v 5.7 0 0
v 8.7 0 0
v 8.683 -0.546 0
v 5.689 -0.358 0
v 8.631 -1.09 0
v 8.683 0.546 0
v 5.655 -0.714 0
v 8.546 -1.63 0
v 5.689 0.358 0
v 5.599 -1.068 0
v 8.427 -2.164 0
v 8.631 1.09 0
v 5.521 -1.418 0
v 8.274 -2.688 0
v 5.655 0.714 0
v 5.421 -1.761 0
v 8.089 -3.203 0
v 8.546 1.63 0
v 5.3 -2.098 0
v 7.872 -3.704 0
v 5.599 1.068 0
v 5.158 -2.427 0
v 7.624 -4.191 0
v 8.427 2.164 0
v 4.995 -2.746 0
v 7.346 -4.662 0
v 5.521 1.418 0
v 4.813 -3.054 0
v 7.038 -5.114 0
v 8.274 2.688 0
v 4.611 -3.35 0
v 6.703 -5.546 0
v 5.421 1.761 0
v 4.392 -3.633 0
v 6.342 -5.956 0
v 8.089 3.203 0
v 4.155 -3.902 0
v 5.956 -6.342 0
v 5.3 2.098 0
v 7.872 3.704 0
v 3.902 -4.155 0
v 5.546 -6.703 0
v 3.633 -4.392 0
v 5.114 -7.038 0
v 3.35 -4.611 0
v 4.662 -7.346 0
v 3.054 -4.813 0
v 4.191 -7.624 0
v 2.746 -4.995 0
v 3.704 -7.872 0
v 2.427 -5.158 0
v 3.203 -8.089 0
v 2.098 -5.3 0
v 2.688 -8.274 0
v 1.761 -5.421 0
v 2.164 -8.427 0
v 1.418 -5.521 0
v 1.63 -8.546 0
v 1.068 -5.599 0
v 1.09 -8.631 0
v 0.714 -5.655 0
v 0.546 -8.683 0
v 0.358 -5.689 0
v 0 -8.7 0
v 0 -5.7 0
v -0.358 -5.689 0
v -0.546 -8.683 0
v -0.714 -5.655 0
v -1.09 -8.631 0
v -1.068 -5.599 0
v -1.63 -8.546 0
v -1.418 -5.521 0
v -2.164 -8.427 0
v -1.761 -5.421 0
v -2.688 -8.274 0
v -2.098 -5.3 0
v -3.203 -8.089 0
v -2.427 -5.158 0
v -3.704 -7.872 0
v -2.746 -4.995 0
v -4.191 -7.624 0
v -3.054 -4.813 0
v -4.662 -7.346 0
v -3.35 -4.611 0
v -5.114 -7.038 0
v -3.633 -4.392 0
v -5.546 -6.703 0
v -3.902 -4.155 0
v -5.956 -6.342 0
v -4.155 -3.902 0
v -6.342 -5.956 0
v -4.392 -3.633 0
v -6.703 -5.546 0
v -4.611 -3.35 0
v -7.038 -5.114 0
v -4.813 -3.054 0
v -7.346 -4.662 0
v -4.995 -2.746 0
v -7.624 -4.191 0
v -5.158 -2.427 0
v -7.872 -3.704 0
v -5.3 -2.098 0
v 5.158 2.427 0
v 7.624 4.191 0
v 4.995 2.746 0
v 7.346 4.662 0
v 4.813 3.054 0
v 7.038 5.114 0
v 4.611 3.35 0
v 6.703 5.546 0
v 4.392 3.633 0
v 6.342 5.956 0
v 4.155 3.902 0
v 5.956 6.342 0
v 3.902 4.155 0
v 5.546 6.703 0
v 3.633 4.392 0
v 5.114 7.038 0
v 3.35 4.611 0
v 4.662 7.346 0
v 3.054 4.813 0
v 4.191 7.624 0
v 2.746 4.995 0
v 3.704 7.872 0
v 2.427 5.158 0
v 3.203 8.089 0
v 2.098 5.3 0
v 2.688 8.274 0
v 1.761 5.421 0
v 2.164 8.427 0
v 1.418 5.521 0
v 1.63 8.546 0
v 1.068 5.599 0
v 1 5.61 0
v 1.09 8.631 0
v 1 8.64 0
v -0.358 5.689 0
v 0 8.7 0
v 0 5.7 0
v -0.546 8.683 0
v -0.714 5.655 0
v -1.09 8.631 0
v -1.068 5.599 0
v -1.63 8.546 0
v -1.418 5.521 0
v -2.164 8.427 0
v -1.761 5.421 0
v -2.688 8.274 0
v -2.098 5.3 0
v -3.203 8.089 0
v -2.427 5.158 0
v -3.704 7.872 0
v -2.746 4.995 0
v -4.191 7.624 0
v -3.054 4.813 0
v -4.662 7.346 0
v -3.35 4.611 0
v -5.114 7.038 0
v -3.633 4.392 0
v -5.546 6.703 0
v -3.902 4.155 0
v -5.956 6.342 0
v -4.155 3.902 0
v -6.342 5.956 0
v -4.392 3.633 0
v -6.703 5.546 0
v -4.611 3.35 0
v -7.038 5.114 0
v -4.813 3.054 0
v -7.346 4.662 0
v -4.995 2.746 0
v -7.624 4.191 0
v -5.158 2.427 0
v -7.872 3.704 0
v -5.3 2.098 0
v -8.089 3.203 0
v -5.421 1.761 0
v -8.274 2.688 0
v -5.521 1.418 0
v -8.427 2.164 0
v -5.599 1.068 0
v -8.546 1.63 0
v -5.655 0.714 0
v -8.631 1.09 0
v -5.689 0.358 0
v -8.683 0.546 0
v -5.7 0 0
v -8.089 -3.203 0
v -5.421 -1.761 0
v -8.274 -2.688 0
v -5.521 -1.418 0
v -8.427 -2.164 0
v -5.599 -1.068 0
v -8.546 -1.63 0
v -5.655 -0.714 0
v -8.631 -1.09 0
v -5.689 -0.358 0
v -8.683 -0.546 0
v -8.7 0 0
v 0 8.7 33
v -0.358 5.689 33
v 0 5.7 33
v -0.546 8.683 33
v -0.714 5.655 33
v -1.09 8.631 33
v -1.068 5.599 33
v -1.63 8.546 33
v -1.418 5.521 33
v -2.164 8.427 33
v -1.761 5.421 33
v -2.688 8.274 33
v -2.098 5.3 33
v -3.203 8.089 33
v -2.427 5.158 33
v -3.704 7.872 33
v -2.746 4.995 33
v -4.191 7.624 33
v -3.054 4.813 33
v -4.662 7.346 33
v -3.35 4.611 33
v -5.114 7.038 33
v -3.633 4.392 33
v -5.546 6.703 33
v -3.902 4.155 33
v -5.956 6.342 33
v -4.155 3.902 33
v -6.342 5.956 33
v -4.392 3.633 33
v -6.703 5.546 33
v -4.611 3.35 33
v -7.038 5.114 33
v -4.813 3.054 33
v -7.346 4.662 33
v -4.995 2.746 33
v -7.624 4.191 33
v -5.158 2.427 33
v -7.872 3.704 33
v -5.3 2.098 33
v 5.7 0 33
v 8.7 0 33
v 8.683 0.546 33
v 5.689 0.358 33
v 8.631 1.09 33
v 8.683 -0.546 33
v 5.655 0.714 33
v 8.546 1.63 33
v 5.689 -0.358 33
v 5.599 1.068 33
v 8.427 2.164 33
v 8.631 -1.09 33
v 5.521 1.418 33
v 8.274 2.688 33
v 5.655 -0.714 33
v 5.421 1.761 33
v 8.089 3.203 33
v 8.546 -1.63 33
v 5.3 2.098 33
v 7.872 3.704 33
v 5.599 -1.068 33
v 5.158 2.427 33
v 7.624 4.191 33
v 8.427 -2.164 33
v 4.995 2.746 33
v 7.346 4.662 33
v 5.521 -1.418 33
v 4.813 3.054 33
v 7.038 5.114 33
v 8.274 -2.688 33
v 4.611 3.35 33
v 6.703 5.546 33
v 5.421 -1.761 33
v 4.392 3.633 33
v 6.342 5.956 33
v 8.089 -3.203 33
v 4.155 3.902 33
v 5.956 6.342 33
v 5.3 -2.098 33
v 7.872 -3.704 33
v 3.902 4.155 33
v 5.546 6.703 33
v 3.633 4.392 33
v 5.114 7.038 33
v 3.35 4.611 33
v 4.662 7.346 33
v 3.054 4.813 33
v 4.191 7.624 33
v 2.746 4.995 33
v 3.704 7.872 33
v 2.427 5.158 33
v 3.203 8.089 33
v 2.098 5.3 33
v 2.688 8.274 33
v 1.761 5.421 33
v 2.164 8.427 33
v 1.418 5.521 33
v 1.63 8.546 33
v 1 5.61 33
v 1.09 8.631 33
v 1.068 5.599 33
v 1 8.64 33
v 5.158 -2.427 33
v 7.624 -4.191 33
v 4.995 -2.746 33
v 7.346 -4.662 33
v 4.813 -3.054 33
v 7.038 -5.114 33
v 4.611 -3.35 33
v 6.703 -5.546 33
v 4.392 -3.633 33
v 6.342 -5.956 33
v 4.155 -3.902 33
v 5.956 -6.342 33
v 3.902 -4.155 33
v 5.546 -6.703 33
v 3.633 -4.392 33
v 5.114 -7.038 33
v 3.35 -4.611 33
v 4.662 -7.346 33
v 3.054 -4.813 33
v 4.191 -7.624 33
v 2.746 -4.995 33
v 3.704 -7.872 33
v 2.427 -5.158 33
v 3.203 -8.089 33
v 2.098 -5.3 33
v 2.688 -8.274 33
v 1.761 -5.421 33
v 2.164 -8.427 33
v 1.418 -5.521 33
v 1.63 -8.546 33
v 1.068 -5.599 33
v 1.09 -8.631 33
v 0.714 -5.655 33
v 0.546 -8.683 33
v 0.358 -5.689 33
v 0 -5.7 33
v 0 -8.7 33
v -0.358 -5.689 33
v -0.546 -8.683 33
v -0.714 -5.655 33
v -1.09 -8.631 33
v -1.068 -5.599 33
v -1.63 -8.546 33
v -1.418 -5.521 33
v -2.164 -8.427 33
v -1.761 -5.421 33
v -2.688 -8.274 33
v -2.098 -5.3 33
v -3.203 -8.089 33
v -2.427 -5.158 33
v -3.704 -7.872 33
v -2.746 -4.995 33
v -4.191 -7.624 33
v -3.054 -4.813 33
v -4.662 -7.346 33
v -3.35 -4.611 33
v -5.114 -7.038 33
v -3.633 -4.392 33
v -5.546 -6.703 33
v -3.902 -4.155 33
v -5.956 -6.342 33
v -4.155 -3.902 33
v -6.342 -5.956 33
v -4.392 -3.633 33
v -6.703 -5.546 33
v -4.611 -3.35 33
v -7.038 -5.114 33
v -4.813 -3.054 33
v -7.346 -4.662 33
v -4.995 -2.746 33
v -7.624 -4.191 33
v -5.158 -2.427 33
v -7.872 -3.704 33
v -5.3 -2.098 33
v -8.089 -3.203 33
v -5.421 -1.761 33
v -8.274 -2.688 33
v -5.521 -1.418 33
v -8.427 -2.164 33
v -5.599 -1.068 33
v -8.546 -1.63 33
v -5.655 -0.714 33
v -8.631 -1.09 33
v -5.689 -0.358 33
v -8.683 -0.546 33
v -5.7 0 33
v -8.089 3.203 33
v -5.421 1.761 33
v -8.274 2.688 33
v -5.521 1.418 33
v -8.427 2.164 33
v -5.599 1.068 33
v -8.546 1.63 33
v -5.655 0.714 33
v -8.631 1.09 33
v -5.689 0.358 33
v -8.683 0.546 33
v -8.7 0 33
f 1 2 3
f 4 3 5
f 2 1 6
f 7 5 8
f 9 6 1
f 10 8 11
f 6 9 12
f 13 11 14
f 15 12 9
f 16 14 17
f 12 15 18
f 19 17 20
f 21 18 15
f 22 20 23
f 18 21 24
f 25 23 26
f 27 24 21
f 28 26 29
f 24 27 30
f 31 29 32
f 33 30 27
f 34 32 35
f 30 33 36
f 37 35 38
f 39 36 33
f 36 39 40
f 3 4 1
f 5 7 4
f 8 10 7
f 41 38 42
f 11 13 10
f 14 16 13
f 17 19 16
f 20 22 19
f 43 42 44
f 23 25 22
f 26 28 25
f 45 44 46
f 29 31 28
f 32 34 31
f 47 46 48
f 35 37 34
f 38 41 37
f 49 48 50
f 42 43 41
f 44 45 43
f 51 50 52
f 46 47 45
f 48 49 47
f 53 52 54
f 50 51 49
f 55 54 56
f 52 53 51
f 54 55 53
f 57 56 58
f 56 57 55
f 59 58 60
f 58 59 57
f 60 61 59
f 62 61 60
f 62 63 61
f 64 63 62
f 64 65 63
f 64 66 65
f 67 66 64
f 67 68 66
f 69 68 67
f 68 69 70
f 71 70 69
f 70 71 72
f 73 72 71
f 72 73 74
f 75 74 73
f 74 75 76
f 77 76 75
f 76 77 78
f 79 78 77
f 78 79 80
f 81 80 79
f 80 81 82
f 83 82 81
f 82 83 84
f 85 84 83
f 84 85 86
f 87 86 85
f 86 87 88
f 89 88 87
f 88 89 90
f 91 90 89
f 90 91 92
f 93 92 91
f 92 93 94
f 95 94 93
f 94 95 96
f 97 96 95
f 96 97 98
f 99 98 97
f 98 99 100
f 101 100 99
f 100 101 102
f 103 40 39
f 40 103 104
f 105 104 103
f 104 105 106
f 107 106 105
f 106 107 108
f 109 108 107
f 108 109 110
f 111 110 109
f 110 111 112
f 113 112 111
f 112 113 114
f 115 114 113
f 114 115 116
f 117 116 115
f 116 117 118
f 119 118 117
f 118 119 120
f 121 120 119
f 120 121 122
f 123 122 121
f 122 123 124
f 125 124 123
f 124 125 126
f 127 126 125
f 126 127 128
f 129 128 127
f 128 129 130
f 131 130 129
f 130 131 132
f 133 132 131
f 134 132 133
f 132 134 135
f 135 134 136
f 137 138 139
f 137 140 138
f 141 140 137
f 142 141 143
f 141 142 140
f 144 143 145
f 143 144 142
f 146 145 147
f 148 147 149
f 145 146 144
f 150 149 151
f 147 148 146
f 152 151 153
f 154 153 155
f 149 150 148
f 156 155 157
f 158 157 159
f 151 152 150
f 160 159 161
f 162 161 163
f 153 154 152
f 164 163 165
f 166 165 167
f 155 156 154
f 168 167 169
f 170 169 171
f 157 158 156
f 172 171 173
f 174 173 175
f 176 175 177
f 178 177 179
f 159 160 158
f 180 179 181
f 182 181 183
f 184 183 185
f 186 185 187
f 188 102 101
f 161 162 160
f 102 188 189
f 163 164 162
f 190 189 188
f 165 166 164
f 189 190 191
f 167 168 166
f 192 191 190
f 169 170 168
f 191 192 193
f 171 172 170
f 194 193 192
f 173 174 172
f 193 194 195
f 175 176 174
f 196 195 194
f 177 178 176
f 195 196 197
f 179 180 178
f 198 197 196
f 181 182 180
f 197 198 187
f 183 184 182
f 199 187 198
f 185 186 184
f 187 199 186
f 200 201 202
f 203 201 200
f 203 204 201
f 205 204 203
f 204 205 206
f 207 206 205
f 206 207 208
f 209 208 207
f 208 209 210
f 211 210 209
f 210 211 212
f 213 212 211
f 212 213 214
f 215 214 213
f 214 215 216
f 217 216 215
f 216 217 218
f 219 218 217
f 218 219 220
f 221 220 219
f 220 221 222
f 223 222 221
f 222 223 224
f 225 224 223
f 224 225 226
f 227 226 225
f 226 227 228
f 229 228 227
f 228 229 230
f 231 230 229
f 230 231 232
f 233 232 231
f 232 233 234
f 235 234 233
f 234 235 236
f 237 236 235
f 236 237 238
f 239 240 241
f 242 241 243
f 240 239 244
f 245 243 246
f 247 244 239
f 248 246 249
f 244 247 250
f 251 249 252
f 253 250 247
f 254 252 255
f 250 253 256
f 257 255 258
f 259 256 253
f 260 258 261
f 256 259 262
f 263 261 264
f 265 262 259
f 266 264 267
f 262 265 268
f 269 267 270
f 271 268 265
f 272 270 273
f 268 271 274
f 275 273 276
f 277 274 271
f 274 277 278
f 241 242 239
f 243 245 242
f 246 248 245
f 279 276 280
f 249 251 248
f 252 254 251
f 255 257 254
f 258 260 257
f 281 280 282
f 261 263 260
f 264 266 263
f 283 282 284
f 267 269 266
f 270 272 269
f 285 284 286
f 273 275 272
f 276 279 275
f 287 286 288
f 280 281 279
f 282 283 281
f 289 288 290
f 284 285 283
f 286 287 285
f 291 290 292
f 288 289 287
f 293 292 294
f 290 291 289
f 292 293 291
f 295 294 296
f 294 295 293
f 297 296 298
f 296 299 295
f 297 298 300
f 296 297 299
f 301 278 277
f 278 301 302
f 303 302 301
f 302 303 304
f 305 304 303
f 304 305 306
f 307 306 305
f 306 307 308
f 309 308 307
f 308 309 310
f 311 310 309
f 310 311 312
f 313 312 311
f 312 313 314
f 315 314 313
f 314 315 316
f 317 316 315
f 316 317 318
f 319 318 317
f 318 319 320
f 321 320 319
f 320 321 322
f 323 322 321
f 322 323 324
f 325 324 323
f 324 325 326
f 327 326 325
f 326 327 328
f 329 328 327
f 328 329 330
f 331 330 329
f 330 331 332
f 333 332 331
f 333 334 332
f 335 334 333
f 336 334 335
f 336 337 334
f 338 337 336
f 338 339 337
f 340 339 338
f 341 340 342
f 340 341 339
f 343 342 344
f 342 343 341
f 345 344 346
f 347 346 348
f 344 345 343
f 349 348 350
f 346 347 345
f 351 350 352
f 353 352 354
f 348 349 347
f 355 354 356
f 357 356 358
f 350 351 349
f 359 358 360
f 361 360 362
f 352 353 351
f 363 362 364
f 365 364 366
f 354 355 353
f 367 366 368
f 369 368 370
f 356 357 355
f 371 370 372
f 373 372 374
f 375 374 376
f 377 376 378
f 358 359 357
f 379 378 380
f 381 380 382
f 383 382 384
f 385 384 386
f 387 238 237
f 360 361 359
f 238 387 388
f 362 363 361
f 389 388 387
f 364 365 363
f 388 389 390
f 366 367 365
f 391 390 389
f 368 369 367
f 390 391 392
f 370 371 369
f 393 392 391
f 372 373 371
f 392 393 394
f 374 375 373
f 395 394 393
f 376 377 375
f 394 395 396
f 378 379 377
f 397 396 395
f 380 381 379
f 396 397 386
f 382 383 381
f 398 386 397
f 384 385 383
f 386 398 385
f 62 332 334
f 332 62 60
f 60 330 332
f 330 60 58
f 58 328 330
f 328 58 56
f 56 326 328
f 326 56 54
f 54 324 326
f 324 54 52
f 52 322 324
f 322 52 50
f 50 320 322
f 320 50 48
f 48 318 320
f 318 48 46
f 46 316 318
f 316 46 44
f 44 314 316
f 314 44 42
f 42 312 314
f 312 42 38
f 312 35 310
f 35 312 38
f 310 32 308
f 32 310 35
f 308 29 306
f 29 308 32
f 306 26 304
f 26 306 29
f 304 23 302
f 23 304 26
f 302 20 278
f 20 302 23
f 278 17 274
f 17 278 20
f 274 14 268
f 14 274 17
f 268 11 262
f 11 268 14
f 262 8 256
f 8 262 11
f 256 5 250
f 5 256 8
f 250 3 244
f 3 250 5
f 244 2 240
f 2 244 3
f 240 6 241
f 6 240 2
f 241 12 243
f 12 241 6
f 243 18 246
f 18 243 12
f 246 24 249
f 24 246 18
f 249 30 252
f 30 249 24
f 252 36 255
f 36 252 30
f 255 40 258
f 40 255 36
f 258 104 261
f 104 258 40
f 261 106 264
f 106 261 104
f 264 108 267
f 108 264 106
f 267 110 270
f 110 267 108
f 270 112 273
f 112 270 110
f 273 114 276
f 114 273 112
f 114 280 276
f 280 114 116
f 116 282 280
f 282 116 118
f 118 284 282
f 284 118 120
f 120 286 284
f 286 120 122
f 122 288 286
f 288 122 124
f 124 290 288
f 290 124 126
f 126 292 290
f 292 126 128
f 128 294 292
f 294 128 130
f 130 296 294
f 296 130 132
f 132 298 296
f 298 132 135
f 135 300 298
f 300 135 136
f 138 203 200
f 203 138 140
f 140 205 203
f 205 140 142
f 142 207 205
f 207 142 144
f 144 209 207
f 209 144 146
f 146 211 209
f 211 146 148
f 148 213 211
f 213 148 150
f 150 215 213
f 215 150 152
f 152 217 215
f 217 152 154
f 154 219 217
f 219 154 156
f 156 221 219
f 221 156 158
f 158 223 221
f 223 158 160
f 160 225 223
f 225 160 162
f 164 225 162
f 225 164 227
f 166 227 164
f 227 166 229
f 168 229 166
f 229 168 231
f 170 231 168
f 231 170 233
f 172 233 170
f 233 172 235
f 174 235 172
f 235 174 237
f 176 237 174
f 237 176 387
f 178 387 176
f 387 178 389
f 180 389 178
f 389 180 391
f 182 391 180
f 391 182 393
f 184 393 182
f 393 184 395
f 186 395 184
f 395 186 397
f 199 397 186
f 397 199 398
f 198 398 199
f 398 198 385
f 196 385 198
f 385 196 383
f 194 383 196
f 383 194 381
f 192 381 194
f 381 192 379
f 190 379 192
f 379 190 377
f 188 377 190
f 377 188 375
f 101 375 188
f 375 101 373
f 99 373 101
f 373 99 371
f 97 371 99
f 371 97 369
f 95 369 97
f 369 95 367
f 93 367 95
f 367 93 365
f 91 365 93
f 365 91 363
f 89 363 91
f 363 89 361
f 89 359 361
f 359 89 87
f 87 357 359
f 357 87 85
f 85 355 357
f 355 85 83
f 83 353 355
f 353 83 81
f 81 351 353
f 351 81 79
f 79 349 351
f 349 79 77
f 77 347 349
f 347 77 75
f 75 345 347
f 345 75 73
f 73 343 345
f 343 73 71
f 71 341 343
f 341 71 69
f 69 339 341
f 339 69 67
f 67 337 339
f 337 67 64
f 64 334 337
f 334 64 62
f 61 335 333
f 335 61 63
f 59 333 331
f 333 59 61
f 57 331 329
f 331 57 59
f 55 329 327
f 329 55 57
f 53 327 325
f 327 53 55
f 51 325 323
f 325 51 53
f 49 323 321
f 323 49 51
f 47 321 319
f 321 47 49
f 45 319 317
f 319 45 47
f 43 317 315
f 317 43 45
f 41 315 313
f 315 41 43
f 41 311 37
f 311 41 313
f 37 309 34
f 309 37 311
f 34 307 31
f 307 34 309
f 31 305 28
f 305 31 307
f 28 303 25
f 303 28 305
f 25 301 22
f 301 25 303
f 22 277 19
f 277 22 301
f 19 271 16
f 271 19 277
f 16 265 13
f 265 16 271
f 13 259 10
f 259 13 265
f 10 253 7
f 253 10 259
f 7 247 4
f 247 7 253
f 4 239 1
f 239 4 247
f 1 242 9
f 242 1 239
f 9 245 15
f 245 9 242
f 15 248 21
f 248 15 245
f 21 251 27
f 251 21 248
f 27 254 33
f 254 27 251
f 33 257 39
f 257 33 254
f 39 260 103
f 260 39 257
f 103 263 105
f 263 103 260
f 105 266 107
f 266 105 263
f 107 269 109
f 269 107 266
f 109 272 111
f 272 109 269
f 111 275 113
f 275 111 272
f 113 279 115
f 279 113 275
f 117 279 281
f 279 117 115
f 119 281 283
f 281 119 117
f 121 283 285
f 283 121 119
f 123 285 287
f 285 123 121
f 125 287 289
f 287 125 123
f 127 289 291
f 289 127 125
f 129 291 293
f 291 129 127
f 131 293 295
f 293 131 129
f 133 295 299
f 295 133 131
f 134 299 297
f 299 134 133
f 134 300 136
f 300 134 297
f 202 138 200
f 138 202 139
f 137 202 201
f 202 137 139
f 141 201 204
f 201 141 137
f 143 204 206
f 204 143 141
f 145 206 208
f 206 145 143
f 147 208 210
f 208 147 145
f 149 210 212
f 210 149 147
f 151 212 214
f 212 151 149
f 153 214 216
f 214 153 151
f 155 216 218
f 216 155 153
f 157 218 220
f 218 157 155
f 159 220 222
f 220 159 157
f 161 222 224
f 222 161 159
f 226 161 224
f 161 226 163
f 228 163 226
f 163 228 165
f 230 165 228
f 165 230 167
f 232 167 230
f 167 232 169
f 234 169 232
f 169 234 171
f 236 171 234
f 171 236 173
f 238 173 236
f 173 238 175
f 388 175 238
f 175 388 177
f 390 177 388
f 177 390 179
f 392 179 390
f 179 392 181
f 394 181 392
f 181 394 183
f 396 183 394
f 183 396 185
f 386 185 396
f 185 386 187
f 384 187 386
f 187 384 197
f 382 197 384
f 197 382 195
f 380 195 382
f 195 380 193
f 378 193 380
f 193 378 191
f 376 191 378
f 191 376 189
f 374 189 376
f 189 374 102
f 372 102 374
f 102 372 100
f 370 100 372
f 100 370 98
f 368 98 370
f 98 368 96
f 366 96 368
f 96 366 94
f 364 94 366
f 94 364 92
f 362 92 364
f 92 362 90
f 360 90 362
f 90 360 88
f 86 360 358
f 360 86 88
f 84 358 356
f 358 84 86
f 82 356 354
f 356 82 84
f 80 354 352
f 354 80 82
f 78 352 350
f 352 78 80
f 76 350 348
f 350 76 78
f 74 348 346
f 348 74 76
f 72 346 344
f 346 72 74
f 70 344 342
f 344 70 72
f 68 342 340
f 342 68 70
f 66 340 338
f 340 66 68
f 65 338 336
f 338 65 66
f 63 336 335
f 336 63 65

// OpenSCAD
use <myTools.scad>
/*
module tube (r = 0, d = 0, l = 0, 
            thick = 0, 
            bCentered = true, 
            taper_pct = 0, 
            circlip = false) // r=radius d=dia l=length ;
*/
$fn=100;
DIA=11.50 - .1;
BAT_THICKNESS = 3;
NUM = 11;
            
tube (d = DIA, l = NUM * BAT_THICKNESS, thick = +3, bCentered = false, taper_pct = 0, circlip = true);
